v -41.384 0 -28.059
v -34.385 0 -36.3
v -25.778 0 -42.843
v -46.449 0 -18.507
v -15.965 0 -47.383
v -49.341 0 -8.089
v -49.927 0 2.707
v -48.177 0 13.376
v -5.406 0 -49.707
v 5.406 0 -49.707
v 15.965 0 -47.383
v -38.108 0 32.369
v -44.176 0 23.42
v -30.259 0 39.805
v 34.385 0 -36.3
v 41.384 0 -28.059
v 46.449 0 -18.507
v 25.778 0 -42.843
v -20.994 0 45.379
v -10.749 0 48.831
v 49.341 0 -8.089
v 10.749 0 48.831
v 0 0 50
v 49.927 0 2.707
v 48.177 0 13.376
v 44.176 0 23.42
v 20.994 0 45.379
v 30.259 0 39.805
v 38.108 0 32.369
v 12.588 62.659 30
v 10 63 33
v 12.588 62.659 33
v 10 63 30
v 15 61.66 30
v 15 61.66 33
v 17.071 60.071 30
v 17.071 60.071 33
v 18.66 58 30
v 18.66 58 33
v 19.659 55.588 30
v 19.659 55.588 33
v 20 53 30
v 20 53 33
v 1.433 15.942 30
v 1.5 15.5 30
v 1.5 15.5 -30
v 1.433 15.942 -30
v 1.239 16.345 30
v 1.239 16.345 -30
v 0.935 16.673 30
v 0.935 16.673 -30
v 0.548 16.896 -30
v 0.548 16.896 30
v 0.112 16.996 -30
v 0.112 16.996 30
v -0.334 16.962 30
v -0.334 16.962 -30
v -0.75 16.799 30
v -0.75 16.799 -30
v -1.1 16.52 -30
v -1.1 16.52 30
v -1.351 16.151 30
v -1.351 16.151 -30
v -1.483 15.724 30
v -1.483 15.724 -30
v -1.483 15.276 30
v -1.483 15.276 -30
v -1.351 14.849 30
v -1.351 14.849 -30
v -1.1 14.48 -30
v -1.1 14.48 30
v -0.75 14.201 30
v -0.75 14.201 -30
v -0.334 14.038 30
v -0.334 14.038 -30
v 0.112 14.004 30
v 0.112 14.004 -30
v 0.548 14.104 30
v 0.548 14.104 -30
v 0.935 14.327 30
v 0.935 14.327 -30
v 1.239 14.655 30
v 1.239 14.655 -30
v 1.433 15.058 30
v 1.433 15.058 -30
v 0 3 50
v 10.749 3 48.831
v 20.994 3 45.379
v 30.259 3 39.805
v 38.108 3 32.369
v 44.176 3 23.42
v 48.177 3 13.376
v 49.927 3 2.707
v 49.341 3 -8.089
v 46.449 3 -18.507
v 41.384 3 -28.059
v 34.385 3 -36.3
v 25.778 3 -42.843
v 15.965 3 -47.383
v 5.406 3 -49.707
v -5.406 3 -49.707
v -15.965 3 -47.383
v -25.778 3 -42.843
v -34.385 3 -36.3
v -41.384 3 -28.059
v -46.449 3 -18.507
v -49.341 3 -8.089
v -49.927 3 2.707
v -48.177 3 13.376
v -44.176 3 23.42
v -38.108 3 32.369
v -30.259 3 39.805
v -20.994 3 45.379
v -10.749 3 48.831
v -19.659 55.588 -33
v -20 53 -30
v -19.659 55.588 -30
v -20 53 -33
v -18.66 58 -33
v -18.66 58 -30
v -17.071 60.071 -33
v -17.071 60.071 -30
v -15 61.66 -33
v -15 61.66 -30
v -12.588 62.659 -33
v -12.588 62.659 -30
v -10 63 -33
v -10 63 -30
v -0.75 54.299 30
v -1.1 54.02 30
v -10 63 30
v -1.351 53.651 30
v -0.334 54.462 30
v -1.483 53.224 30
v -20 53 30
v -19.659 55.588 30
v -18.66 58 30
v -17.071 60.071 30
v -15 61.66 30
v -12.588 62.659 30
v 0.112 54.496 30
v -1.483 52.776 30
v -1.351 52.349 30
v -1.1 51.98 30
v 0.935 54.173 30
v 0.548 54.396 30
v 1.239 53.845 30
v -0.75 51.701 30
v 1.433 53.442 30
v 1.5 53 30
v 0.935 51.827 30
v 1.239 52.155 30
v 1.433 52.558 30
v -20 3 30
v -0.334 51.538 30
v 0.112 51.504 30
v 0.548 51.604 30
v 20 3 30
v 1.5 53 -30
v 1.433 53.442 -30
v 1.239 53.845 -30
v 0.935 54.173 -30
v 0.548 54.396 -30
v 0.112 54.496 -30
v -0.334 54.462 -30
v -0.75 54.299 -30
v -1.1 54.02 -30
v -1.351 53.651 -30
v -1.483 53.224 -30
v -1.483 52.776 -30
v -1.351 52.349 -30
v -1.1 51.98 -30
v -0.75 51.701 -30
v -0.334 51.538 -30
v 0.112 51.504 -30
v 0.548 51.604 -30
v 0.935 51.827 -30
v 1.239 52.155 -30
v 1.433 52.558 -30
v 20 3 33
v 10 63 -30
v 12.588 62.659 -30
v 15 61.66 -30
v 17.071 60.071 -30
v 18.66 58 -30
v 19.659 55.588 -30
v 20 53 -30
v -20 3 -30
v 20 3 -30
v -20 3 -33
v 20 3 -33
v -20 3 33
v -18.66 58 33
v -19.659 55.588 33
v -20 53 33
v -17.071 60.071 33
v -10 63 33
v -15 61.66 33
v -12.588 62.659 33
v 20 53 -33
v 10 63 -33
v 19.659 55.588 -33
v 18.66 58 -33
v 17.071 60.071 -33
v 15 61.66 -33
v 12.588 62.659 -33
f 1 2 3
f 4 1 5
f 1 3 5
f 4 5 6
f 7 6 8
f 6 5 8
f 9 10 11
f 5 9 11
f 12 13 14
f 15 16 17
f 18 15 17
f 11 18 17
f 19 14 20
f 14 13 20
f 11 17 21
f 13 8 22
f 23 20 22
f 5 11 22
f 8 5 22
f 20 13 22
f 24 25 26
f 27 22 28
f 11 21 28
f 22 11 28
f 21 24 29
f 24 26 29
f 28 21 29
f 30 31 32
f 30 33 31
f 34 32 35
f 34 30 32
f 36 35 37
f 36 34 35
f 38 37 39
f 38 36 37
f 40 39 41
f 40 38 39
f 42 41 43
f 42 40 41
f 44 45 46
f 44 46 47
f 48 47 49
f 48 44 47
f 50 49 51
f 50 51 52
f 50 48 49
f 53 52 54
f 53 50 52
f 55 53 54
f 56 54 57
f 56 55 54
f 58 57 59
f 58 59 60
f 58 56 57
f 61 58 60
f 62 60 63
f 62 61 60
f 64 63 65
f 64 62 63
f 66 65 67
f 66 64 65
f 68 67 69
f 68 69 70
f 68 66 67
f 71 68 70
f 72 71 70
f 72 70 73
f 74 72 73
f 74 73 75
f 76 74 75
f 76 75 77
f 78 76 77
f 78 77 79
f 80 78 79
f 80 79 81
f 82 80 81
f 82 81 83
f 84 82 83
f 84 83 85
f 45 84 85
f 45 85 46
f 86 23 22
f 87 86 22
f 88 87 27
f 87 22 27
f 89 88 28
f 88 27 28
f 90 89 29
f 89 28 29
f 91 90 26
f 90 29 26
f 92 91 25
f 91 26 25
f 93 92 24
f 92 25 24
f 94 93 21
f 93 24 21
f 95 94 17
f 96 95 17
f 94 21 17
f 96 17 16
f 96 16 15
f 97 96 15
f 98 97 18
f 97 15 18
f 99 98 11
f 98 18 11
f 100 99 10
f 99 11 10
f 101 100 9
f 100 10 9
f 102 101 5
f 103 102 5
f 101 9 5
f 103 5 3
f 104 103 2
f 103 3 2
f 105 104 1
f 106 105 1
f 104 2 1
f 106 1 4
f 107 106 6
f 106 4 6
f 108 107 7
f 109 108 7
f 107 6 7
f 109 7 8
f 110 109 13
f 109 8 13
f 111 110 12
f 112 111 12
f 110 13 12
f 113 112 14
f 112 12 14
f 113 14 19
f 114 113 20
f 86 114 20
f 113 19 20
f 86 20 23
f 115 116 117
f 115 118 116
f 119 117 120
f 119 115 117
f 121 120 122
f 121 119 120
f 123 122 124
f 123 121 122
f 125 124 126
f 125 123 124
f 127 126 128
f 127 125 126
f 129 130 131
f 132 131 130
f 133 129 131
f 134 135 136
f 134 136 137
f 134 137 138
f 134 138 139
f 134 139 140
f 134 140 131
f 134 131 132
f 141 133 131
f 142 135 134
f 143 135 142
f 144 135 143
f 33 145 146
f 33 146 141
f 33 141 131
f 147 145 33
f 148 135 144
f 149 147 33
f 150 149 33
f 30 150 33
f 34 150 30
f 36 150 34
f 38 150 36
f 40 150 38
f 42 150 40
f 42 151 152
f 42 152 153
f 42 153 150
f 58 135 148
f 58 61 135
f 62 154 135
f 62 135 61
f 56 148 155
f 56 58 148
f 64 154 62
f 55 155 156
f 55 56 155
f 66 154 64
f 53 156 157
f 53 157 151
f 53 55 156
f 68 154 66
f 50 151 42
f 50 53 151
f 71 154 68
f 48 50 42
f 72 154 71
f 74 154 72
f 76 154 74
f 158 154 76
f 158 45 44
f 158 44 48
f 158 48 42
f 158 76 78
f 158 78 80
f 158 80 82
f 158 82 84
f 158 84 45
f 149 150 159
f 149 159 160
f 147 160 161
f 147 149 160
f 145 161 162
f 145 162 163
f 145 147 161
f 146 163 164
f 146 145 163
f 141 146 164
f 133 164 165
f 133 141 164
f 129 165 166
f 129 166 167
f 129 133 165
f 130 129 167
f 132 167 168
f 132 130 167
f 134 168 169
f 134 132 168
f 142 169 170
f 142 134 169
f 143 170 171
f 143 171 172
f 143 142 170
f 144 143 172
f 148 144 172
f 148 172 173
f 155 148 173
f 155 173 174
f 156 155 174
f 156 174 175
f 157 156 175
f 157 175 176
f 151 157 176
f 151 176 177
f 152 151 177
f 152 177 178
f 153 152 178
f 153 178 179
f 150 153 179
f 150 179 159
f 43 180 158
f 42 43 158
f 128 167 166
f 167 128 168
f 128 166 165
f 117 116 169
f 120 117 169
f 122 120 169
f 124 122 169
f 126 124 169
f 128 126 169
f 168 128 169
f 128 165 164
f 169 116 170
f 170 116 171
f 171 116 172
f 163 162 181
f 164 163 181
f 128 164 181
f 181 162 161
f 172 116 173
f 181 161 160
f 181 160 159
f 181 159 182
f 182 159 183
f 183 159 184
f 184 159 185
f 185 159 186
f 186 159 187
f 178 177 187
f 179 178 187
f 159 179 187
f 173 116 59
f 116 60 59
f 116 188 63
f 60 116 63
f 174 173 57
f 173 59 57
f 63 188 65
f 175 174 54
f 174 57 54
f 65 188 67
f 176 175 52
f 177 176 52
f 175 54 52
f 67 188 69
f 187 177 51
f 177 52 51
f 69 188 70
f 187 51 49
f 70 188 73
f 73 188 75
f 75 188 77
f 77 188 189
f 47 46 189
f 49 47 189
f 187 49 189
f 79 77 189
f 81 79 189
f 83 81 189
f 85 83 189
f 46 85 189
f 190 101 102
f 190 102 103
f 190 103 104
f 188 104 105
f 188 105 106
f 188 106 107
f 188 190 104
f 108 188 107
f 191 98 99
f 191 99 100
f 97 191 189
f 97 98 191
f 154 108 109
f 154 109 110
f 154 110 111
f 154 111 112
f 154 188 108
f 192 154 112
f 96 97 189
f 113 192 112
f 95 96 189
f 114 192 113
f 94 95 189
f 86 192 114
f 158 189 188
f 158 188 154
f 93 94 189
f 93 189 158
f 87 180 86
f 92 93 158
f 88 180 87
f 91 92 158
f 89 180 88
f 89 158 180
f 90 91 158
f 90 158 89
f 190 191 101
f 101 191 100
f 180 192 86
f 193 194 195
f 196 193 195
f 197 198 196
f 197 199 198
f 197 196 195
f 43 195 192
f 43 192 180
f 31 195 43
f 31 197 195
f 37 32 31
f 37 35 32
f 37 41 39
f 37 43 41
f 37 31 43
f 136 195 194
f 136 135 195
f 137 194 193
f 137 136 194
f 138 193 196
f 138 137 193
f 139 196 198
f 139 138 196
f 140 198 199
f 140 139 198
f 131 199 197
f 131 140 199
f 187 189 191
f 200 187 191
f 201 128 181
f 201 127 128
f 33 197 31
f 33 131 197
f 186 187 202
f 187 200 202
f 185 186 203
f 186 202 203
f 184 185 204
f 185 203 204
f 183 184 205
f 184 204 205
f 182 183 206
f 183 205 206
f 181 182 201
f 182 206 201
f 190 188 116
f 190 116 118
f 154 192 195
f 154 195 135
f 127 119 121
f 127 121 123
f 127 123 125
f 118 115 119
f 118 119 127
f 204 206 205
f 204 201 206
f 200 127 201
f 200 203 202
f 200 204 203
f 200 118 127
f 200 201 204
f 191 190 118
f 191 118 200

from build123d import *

# Parameters (mm, degrees)
SKETCH1_R           = 50
BOSS_EXTRUDE1_DEPTH = 3
SKETCH3_W           = 40
SKETCH3_H           = 3
BOSS_EXTRUDE3_DEPTH = 60
SKETCH4_R           = 1.5
BOSS_EXTRUDE4_DEPTH = 63
FILLET1_R           = 10


with BuildPart() as part:
    # Sketch1 → Boss-Extrude1 (new body)
    with BuildSketch(Plane(origin=(0, 0, 0), x_dir=(1, 0, 0), z_dir=(0, 1, 0))):
        with Locations(Location((0, 0, 0), (0, 0, 270))):
            Circle(SKETCH1_R)
    extrude(amount=BOSS_EXTRUDE1_DEPTH)

    # Sketch3 → Boss-Extrude3 (add)
    with BuildSketch(Plane(origin=(0, 3, 0), x_dir=(1, 0, 0), z_dir=(0, 1, 0))):
        with Locations((0, -31.5)):
            Rectangle(SKETCH3_W, SKETCH3_H)
        with Locations((0, 31.5)):
            Rectangle(SKETCH3_W, SKETCH3_H)
    extrude(amount=BOSS_EXTRUDE3_DEPTH)

    # Sketch4 → Boss-Extrude4 (add)
    with BuildSketch(Plane.XY.offset(33)):
        with Locations((0, 53)):
            Circle(SKETCH4_R)
        with Locations((0, 15.5)):
            Circle(SKETCH4_R)
    extrude(amount=-BOSS_EXTRUDE4_DEPTH)

    # Fillet1
    fillet1_edges = [part.edges().sort_by_distance(p)[0] for p in [
        (-20, 63, -31.5),
        (20, 63, -31.5),
        (-20, 63, 31.5),
        (20, 63, 31.5),
    ]]
    fillet(fillet1_edges, radius=FILLET1_R)


solid = part.part
